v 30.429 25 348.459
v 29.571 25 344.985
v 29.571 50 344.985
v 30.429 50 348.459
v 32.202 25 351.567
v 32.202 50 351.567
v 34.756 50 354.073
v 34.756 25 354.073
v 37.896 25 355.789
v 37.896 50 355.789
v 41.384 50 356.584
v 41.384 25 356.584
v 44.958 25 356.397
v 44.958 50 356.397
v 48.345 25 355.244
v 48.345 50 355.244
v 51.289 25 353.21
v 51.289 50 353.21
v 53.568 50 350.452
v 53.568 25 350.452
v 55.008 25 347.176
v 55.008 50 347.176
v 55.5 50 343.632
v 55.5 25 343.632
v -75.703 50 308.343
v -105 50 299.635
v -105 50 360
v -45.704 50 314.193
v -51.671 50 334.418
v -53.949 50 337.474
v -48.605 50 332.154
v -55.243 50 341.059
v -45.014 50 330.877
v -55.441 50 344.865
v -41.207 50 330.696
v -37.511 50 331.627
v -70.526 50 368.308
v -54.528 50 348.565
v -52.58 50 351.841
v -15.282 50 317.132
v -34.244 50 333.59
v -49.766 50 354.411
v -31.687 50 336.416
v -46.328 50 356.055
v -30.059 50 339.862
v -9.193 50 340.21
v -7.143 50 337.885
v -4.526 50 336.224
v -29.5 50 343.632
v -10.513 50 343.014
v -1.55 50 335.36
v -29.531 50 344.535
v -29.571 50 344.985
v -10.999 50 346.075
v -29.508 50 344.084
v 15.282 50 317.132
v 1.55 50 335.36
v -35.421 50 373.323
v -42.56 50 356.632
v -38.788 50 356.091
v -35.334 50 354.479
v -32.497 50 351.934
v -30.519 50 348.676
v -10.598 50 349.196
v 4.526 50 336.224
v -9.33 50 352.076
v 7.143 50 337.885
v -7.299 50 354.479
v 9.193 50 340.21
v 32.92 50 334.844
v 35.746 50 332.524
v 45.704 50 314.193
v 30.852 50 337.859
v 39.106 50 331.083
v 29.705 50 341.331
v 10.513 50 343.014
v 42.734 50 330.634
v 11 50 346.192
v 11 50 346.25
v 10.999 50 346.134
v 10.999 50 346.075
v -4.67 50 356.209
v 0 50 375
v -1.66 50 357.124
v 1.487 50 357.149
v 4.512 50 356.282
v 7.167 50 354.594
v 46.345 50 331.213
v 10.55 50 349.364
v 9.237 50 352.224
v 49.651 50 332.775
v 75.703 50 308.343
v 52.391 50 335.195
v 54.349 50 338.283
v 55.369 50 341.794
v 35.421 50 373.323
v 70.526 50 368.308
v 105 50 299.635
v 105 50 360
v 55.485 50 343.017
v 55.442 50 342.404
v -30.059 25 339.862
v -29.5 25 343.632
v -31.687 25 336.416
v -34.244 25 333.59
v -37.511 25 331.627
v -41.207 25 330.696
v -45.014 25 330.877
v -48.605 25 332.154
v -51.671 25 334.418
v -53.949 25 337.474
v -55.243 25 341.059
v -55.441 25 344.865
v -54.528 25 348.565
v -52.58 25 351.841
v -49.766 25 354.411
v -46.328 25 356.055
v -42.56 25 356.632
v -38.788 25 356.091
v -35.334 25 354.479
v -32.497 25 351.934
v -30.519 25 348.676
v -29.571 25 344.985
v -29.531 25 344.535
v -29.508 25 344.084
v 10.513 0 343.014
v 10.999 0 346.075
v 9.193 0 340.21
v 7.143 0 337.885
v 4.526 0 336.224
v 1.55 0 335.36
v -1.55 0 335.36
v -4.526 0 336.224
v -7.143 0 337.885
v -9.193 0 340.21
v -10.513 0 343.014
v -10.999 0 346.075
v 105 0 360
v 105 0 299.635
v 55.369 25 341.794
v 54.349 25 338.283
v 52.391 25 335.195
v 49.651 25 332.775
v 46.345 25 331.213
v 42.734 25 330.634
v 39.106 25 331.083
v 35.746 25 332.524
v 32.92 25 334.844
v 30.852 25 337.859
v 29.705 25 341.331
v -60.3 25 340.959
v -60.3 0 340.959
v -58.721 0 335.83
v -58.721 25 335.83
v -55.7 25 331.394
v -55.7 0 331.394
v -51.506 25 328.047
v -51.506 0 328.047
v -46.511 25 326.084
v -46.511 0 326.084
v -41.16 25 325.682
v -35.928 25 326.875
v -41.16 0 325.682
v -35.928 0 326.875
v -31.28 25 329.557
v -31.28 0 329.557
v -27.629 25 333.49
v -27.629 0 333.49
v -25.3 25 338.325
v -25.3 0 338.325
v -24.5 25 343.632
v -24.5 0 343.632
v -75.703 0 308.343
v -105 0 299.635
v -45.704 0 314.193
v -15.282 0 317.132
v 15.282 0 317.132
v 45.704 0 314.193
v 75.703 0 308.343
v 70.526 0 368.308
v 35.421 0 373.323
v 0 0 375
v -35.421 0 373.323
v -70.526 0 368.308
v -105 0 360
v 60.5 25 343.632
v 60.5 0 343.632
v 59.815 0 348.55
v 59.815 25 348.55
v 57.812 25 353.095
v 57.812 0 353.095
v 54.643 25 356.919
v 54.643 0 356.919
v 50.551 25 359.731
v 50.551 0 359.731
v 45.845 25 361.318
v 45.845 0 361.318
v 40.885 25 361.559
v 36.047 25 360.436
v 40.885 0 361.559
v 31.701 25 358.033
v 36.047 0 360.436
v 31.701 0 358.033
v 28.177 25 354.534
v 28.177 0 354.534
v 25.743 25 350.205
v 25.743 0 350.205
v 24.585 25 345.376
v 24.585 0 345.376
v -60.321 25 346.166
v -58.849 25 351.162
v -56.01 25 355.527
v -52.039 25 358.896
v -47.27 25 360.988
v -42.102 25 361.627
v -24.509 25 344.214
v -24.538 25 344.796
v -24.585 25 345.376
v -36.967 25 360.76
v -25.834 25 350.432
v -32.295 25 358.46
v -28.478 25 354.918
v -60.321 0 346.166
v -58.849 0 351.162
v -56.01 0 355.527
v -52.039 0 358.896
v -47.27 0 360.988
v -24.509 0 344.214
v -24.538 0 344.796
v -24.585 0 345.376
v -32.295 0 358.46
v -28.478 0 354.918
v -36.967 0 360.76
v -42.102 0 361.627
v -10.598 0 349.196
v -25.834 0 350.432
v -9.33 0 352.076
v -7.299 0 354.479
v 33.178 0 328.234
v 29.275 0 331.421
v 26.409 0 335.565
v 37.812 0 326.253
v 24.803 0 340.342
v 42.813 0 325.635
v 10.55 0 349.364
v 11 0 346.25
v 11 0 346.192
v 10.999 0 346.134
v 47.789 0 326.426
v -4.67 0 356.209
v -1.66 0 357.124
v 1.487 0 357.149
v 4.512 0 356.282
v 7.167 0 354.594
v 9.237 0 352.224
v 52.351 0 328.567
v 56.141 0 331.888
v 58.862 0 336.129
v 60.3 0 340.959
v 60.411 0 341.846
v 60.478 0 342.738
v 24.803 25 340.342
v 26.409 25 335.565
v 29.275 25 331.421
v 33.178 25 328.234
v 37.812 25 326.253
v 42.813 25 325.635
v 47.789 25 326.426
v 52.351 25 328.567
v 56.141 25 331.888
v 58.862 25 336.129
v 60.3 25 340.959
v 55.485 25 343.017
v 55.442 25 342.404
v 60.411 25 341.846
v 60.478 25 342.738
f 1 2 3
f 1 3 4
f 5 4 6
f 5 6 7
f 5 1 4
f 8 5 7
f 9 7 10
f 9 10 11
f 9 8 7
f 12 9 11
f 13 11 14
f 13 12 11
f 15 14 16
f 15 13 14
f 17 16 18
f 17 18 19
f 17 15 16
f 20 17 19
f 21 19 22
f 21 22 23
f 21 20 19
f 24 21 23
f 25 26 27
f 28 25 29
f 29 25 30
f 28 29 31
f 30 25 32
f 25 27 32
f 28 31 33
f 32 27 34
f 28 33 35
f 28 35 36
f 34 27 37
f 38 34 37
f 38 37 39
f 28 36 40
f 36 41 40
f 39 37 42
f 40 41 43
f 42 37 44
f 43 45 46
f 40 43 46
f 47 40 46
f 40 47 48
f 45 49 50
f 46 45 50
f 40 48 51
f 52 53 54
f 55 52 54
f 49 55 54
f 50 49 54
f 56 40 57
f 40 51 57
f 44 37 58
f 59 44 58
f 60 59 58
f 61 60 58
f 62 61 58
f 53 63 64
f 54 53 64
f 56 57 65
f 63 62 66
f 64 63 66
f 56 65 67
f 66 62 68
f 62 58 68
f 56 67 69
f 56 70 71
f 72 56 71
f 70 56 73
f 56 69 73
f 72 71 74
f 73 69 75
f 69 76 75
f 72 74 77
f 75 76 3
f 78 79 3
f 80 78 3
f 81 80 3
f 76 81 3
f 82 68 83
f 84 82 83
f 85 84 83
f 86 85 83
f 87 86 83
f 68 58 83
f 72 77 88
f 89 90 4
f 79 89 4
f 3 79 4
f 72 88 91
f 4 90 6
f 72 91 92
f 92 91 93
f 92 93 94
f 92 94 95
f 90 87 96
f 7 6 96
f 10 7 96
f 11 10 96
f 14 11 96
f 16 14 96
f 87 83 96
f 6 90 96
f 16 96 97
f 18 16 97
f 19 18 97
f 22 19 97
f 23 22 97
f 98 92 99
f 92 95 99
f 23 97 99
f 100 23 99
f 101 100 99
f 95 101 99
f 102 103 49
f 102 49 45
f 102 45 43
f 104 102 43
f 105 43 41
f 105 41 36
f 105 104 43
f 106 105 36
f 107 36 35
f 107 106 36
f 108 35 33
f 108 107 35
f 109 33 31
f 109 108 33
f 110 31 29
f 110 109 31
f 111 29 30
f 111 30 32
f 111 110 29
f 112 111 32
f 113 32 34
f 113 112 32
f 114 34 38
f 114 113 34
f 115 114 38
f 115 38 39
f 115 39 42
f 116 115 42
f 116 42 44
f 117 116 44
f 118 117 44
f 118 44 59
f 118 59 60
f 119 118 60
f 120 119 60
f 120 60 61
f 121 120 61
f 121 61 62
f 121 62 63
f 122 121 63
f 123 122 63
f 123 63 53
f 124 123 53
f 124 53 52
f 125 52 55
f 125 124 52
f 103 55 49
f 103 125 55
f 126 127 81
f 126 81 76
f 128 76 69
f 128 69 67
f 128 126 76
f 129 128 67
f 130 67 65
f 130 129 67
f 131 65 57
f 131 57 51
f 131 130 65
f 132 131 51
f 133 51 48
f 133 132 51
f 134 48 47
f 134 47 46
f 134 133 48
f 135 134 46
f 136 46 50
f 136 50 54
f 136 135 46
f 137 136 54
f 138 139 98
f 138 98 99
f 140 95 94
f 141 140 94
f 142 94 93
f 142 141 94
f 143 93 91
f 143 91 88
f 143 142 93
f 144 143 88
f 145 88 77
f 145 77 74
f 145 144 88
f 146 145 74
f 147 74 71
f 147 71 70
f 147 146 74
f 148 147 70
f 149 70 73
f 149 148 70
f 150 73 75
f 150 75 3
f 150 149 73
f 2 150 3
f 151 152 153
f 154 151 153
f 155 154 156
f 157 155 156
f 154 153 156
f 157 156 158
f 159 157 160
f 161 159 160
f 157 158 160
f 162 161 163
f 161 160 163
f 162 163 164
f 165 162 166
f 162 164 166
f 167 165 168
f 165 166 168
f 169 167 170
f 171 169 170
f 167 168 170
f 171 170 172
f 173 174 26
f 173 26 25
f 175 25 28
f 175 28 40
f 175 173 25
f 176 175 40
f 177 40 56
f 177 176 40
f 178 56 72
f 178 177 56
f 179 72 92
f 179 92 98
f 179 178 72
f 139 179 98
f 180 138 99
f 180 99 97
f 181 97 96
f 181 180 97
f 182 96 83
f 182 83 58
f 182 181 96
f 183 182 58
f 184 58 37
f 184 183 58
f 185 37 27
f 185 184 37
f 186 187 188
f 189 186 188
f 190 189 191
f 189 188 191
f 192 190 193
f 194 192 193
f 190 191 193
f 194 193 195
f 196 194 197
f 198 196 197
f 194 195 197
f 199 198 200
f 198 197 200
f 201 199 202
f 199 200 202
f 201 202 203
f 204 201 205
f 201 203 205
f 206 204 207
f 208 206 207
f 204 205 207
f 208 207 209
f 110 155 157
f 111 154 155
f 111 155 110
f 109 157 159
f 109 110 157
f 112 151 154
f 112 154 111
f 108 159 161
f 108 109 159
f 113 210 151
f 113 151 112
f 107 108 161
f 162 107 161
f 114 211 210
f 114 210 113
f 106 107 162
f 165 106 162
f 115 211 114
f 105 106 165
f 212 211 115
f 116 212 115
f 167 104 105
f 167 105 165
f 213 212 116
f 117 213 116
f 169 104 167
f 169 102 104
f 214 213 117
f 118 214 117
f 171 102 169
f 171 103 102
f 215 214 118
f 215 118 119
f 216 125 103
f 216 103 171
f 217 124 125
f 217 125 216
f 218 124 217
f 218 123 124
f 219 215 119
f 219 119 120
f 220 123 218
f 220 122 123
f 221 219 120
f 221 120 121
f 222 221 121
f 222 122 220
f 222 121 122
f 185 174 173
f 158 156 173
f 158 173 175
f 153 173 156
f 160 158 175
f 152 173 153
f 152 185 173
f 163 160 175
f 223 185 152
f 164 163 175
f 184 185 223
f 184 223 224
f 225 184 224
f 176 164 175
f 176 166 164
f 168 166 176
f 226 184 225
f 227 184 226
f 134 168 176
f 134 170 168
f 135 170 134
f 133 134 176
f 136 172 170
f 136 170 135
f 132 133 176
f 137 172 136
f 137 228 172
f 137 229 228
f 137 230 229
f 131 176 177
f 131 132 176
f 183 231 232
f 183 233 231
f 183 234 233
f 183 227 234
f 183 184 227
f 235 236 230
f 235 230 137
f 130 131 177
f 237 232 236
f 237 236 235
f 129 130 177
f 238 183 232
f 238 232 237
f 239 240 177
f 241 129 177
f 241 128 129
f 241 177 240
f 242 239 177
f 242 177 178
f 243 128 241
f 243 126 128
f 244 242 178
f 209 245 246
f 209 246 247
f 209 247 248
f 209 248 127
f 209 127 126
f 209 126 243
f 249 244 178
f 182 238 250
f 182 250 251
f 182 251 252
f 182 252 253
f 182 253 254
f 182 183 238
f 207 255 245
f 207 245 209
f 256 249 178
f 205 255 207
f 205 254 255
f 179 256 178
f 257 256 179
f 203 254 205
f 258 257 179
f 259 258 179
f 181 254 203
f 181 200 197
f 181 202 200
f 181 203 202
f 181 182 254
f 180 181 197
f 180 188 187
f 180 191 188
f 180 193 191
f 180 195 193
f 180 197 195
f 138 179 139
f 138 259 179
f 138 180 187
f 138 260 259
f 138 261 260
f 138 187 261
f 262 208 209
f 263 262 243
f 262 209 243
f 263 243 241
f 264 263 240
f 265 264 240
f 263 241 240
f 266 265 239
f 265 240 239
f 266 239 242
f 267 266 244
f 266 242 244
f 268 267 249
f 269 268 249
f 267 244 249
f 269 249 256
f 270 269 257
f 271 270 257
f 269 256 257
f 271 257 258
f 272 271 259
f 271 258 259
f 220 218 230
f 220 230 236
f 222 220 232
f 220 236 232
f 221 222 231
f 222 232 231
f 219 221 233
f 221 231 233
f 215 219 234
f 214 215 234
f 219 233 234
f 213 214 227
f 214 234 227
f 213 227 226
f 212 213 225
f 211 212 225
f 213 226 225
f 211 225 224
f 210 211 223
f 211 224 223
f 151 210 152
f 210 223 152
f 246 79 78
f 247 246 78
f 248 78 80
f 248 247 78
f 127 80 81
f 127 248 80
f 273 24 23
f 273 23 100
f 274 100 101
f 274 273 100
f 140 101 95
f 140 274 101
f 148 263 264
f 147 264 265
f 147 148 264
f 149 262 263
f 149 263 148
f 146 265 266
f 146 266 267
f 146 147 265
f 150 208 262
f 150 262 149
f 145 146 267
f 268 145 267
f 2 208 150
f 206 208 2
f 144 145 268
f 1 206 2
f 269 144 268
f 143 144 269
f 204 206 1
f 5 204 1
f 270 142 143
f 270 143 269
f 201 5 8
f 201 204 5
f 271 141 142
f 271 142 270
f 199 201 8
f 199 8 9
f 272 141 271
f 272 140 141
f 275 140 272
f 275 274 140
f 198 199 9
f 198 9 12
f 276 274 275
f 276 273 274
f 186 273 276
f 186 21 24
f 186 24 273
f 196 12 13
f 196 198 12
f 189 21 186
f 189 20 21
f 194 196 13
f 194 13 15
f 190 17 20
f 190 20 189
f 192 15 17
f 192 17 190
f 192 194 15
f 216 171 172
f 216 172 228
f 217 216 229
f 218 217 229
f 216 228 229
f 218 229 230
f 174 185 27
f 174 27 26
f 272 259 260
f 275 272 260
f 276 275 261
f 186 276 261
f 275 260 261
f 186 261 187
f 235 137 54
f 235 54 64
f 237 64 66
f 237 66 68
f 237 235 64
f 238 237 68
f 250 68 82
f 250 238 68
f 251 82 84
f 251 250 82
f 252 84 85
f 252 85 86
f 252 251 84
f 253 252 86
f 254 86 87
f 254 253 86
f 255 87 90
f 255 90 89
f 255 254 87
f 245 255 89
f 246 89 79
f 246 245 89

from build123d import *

# Parameters (mm, degrees)
F1_DEPTH = 50
F2_DEPTH = 25


with BuildPart() as f1:
    # F0 (on Front) → F1 (new body)
    with BuildSketch(Plane.XZ):
        with BuildLine():
            ThreePointArc((60.3004275437, 340.9588258691), (82.833452945, 336.1958976151), (105, 329.9455447494))
            Line((105, 329.9455447494), (105, 360))
            ThreePointArc((105, 360), (0, 375), (-105, 360))
            Line((-105, 360), (-105, 329.9455447494))
            ThreePointArc((-105, 329.9455447494), (-82.833452945, 336.1958976151), (-60.3004275437, 340.9588258691))
            ThreePointArc((-60.3004275437, 340.9588258691), (-44.7093862816, 361.4956891559), (-24.5847162741, 345.3761054643))
            ThreePointArc((-24.5847162741, 345.3761054643), (-17.7950983093, 345.7924189108), (-10.9986121712, 346.0752707581))
            ThreePointArc((-10.9986121712, 346.0752707581), (-0.0873673767, 357.2496530373), (11, 346.25))
            ThreePointArc((11, 346.25), (10.9996530373, 346.1626326233), (10.9986121712, 346.0752707581))
            ThreePointArc((10.9986121712, 346.0752707581), (17.7950983093, 345.7924189108), (24.5847162741, 345.3761054643))
            ThreePointArc((24.5847162741, 345.3761054643), (43.3731818064, 361.6106063163), (60.5, 343.6317978593))
            ThreePointArc((60.5, 343.6317978593), (60.4500375457, 342.2915918653), (60.3004275437, 340.9588258691))
        make_face()
        with BuildLine():
            ThreePointArc((-105, 299.635194862), (0, 317.5), (105, 299.635194862))
            Line((105, 299.635194862), (105, 329.9455447494))
            ThreePointArc((105, 329.9455447494), (82.833452945, 336.1958976151), (60.3004275437, 340.9588258691))
            ThreePointArc((60.3004275437, 340.9588258691), (40.2906137184, 325.7679065626), (24.5847162741, 345.3761054643))
            ThreePointArc((24.5847162741, 345.3761054643), (17.7950983093, 345.7924189108), (10.9986121712, 346.0752707581))
            ThreePointArc((10.9986121712, 346.0752707581), (0, 335.25), (-10.9986121712, 346.0752707581))
            ThreePointArc((-10.9986121712, 346.0752707581), (-17.7950983093, 345.7924189108), (-24.5847162741, 345.3761054643))
            ThreePointArc((-24.5847162741, 345.3761054643), (-24.521191543, 344.5049796657), (-24.5, 343.6317978593))
            ThreePointArc((-24.5, 343.6317978593), (-41.159794006, 325.6817603135), (-60.3004275437, 340.9588258691))
            ThreePointArc((-60.3004275437, 340.9588258691), (-82.833452945, 336.1958976151), (-105, 329.9455447494))
            Line((-105, 329.9455447494), (-105, 299.635194862))
        make_face()
        with BuildLine():
            ThreePointArc((-24.5847162741, 345.3761054643), (-44.7093862816, 361.4956891559), (-60.3004275437, 340.9588258691))
            ThreePointArc((-60.3004275437, 340.9588258691), (-57.8364575566, 341.3854224733), (-55.3694709553, 341.7942132133))
            ThreePointArc((-55.3694709553, 341.7942132133), (-44.09566787, 356.5334971291), (-29.5706194929, 344.9849865759))
            ThreePointArc((-29.5706194929, 344.9849865759), (-27.0783740558, 345.1895481594), (-24.5847162741, 345.3761054643))
        make_face()
        with BuildLine():
            ThreePointArc((-55.3694709553, 341.7942132133), (-57.8364575566, 341.3854224733), (-60.3004275437, 340.9588258691))
            ThreePointArc((-60.3004275437, 340.9588258691), (-41.159794006, 325.6817603135), (-24.5, 343.6317978593))
            ThreePointArc((-24.5, 343.6317978593), (-24.521191543, 344.5049796657), (-24.5847162741, 345.3761054643))
            ThreePointArc((-24.5847162741, 345.3761054643), (-27.0783740558, 345.1895481594), (-29.5706194929, 344.9849865759))
            ThreePointArc((-29.5706194929, 344.9849865759), (-29.5176668778, 344.3093129543), (-29.5, 343.6317978593))
            ThreePointArc((-29.5, 343.6317978593), (-41.5788926281, 330.6644711799), (-55.3694709553, 341.7942132133))
        make_face()
        with BuildLine():
            ThreePointArc((55.3694709553, 341.7942132133), (57.8364575566, 341.3854224733), (60.3004275437, 340.9588258691))
            ThreePointArc((60.3004275437, 340.9588258691), (60.4500375457, 342.2915918653), (60.5, 343.6317978593))
            ThreePointArc((60.5, 343.6317978593), (43.3731818064, 361.6106063163), (24.5847162741, 345.3761054643))
            ThreePointArc((24.5847162741, 345.3761054643), (27.0783740558, 345.1895481594), (29.5706194929, 344.9849865759))
            ThreePointArc((29.5706194929, 344.9849865759), (43.177515095, 356.6141309815), (55.5, 343.6317978593))
            ThreePointArc((55.5, 343.6317978593), (55.4673266794, 342.7106904874), (55.3694709553, 341.7942132133))
        make_face()
        with BuildLine():
            ThreePointArc((24.5847162741, 345.3761054643), (40.2906137184, 325.7679065626), (60.3004275437, 340.9588258691))
            ThreePointArc((60.3004275437, 340.9588258691), (57.8364575566, 341.3854224733), (55.3694709553, 341.7942132133))
            ThreePointArc((55.3694709553, 341.7942132133), (40.90433213, 330.7300985895), (29.5706194929, 344.9849865759))
            ThreePointArc((29.5706194929, 344.9849865759), (27.0783740558, 345.1895481594), (24.5847162741, 345.3761054643))
        make_face()
    extrude(amount=-F1_DEPTH)

    # F0 (on Front) → F2 (cut)
    with BuildSketch(Plane.XZ):
        with BuildLine():
            ThreePointArc((-24.5847162741, 345.3761054643), (-44.7093862816, 361.4956891559), (-60.3004275437, 340.9588258691))
            ThreePointArc((-60.3004275437, 340.9588258691), (-57.8364575566, 341.3854224733), (-55.3694709553, 341.7942132133))
            ThreePointArc((-55.3694709553, 341.7942132133), (-44.09566787, 356.5334971291), (-29.5706194929, 344.9849865759))
            ThreePointArc((-29.5706194929, 344.9849865759), (-27.0783740558, 345.1895481594), (-24.5847162741, 345.3761054643))
        make_face()
        with BuildLine():
            ThreePointArc((-55.3694709553, 341.7942132133), (-57.8364575566, 341.3854224733), (-60.3004275437, 340.9588258691))
            ThreePointArc((-60.3004275437, 340.9588258691), (-41.159794006, 325.6817603135), (-24.5, 343.6317978593))
            ThreePointArc((-24.5, 343.6317978593), (-24.521191543, 344.5049796657), (-24.5847162741, 345.3761054643))
            ThreePointArc((-24.5847162741, 345.3761054643), (-27.0783740558, 345.1895481594), (-29.5706194929, 344.9849865759))
            ThreePointArc((-29.5706194929, 344.9849865759), (-29.5176668778, 344.3093129543), (-29.5, 343.6317978593))
            ThreePointArc((-29.5, 343.6317978593), (-41.5788926281, 330.6644711799), (-55.3694709553, 341.7942132133))
        make_face()
        with BuildLine():
            ThreePointArc((55.3694709553, 341.7942132133), (57.8364575566, 341.3854224733), (60.3004275437, 340.9588258691))
            ThreePointArc((60.3004275437, 340.9588258691), (60.4500375457, 342.2915918653), (60.5, 343.6317978593))
            ThreePointArc((60.5, 343.6317978593), (43.3731818064, 361.6106063163), (24.5847162741, 345.3761054643))
            ThreePointArc((24.5847162741, 345.3761054643), (27.0783740558, 345.1895481594), (29.5706194929, 344.9849865759))
            ThreePointArc((29.5706194929, 344.9849865759), (43.177515095, 356.6141309815), (55.5, 343.6317978593))
            ThreePointArc((55.5, 343.6317978593), (55.4673266794, 342.7106904874), (55.3694709553, 341.7942132133))
        make_face()
        with BuildLine():
            ThreePointArc((24.5847162741, 345.3761054643), (40.2906137184, 325.7679065626), (60.3004275437, 340.9588258691))
            ThreePointArc((60.3004275437, 340.9588258691), (57.8364575566, 341.3854224733), (55.3694709553, 341.7942132133))
            ThreePointArc((55.3694709553, 341.7942132133), (40.90433213, 330.7300985895), (29.5706194929, 344.9849865759))
            ThreePointArc((29.5706194929, 344.9849865759), (27.0783740558, 345.1895481594), (24.5847162741, 345.3761054643))
        make_face()
    extrude(amount=-F2_DEPTH, mode=Mode.SUBTRACT)


solid = f1.part
